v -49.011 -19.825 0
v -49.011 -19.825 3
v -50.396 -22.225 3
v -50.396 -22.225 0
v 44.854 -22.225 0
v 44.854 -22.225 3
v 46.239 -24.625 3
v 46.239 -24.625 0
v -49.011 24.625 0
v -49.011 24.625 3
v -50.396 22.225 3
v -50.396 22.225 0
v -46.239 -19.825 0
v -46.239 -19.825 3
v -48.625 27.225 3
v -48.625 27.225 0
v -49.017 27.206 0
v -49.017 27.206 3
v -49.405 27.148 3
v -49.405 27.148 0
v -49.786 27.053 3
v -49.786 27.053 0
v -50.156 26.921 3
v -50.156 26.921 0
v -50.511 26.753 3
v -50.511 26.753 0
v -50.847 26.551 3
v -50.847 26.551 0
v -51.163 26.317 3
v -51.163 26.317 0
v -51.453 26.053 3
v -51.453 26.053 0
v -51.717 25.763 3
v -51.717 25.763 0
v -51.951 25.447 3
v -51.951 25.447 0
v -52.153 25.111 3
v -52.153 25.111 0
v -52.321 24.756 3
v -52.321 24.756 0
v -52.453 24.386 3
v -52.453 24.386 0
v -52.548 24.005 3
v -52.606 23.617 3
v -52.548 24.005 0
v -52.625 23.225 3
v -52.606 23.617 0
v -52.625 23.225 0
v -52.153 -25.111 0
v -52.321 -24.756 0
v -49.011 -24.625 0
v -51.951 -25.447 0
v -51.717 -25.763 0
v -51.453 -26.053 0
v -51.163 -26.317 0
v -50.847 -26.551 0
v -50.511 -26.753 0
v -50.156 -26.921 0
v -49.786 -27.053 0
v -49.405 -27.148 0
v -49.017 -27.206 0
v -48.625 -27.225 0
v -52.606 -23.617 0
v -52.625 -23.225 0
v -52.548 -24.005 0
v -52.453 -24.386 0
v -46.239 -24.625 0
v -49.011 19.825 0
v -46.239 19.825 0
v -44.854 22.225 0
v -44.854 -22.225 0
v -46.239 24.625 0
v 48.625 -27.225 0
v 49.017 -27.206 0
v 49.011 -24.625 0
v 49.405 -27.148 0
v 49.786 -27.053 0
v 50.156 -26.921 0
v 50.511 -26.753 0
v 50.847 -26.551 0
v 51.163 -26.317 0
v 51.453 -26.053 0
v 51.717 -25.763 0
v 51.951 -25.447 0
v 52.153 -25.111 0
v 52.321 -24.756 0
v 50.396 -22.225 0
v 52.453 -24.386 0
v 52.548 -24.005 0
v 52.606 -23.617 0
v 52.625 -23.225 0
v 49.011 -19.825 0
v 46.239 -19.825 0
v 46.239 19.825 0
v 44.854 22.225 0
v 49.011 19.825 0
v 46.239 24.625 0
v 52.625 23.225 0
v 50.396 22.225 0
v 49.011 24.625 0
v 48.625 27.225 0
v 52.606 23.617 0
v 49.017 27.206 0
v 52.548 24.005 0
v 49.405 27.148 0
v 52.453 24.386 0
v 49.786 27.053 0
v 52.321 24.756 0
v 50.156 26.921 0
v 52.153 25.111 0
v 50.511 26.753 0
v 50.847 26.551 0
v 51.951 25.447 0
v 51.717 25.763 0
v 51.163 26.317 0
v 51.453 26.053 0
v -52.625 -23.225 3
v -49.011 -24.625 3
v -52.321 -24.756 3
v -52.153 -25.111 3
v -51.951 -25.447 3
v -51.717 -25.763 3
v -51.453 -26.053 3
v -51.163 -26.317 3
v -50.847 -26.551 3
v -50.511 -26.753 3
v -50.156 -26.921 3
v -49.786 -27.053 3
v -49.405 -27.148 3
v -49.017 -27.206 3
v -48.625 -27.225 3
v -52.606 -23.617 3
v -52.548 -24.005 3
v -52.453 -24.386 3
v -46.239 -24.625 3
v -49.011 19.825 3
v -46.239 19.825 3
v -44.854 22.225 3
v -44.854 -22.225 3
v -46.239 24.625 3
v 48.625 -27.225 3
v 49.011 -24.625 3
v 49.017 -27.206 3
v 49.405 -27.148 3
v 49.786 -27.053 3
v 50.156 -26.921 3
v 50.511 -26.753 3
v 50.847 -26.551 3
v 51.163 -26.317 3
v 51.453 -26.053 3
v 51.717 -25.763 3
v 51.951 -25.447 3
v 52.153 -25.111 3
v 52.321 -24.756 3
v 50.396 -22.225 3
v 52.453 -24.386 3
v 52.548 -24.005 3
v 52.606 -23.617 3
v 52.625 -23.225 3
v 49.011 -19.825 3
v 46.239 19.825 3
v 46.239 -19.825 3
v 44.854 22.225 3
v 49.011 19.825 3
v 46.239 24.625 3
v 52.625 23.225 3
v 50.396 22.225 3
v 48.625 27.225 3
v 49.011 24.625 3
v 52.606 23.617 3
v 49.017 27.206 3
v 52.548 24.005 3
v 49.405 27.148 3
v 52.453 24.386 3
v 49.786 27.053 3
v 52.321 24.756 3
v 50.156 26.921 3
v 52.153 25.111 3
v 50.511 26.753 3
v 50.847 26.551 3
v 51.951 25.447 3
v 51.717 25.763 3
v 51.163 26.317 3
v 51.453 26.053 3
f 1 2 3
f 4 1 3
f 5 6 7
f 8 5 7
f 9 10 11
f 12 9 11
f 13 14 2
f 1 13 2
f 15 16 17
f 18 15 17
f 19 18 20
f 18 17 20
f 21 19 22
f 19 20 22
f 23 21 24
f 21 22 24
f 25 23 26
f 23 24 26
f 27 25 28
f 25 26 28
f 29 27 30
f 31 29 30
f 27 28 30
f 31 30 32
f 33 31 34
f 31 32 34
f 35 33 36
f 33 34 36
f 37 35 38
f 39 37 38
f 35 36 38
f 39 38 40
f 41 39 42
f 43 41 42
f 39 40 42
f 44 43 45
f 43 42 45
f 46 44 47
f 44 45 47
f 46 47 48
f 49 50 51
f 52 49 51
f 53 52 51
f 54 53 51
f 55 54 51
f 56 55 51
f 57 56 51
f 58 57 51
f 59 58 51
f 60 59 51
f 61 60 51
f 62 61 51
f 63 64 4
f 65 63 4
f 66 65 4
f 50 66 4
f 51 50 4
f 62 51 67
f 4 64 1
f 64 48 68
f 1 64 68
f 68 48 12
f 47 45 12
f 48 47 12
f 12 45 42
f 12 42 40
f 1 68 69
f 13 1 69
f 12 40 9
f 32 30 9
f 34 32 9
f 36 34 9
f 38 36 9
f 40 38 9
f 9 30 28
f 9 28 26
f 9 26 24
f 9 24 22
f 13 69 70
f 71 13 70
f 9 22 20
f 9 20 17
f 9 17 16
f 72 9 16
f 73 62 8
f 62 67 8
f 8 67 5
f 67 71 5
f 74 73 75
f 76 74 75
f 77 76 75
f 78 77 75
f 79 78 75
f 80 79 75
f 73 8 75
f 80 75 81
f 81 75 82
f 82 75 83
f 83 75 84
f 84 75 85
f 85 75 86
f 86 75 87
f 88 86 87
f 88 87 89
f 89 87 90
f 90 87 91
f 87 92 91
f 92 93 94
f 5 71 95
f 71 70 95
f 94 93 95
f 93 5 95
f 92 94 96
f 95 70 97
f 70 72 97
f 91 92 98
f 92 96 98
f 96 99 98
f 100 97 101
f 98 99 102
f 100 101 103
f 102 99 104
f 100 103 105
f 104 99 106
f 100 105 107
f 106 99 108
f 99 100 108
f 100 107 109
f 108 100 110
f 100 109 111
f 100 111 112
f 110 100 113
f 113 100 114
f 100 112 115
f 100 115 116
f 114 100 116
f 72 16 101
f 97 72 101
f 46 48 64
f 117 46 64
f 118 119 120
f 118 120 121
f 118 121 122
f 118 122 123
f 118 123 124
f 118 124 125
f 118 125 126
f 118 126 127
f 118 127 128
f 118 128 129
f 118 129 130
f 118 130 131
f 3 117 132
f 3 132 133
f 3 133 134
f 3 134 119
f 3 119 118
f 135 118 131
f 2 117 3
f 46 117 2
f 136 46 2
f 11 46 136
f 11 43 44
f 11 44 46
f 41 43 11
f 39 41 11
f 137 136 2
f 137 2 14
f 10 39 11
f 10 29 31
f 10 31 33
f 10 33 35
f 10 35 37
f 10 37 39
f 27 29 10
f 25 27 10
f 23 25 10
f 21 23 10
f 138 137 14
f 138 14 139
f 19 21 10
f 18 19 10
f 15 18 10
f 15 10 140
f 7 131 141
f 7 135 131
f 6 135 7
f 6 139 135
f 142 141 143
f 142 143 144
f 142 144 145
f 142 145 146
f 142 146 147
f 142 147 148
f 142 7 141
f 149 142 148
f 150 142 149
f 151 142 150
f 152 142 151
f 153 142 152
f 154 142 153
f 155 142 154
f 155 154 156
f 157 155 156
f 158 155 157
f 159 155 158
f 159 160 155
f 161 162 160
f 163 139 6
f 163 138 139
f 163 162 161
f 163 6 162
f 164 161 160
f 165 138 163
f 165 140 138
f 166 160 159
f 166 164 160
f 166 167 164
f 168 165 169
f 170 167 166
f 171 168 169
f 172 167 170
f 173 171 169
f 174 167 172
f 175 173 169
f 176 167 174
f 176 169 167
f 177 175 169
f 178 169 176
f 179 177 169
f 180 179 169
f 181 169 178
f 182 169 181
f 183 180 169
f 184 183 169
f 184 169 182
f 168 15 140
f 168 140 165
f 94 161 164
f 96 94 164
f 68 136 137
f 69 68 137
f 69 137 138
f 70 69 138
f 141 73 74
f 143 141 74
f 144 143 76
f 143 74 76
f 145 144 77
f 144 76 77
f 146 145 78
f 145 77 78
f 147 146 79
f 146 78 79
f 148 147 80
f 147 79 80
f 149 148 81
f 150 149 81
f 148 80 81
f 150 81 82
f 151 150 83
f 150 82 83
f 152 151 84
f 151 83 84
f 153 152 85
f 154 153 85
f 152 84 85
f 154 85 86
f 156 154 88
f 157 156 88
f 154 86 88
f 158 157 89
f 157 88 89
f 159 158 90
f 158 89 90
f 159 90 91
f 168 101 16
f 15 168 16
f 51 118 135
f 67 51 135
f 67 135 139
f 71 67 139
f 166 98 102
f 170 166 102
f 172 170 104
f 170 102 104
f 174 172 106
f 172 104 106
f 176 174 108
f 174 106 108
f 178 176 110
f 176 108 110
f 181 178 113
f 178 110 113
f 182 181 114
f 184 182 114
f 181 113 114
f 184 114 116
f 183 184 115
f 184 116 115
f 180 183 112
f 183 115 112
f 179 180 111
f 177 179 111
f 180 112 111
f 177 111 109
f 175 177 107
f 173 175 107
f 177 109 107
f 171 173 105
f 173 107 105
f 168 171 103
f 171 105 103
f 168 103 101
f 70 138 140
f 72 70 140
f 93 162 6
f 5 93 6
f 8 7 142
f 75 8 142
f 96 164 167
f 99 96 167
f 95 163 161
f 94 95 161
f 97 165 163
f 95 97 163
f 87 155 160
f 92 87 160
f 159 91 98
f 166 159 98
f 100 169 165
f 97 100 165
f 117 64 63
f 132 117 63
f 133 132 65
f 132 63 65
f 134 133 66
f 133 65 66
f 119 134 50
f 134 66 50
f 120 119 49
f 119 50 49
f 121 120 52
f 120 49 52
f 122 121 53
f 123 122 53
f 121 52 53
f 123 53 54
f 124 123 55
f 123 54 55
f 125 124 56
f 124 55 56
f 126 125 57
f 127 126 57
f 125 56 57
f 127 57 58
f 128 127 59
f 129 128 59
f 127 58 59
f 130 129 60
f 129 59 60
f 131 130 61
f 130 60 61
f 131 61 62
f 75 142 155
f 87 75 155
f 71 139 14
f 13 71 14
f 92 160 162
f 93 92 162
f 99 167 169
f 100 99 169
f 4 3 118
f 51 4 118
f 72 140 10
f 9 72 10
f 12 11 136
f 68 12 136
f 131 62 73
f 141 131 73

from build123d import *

# Parameters (mm, degrees)
PAD_DEPTH    = 3
POCKET_DEPTH = 3.001


with BuildPart() as part:
    # Sketch → Pad (new body)
    with BuildSketch(Plane.XY):
        with BuildLine():
            Line((-52.625, 23.225), (-52.625, -23.225))
            ThreePointArc((-52.625, -23.225), (-51.453427, -26.053427), (-48.625, -27.225))
            Line((-48.625, -27.225), (48.625, -27.225))
            ThreePointArc((48.625, -27.225), (51.453427, -26.053427), (52.625, -23.225))
            Line((52.625, -23.225), (52.625, 23.225))
            ThreePointArc((52.625, 23.225), (51.453427, 26.053427), (48.625, 27.225))
            Line((48.625, 27.225), (-48.625, 27.225))
            ThreePointArc((-48.625, 27.225), (-51.453427, 26.053427), (-52.625, 23.225))
        make_face()
    extrude(amount=PAD_DEPTH)

    # Sketch001 (on Face10 of Pad) → Pocket (cut, through all)
    with BuildSketch(Plane.XY.offset(3)):
        Polygon((-44.853719, -22.225), (-46.239359, -19.825), (-49.010641, -19.825), (-50.396281, -22.225), (-49.010641, -24.625), (-46.239359, -24.625), align=None)
        Polygon((44.853719, -22.225), (46.239359, -24.625), (49.010641, -24.625), (50.396281, -22.225), (49.010641, -19.825), (46.239359, -19.825), align=None)
        Polygon((44.853719, 22.225), (46.239359, 19.825), (49.010641, 19.825), (50.396281, 22.225), (49.010641, 24.625), (46.239359, 24.625), align=None)
        Polygon((-44.853719, 22.225), (-46.239359, 24.625), (-49.010641, 24.625), (-50.396281, 22.225), (-49.010641, 19.825), (-46.239359, 19.825), align=None)
    extrude(amount=-POCKET_DEPTH, mode=Mode.SUBTRACT)


solid = part.part
